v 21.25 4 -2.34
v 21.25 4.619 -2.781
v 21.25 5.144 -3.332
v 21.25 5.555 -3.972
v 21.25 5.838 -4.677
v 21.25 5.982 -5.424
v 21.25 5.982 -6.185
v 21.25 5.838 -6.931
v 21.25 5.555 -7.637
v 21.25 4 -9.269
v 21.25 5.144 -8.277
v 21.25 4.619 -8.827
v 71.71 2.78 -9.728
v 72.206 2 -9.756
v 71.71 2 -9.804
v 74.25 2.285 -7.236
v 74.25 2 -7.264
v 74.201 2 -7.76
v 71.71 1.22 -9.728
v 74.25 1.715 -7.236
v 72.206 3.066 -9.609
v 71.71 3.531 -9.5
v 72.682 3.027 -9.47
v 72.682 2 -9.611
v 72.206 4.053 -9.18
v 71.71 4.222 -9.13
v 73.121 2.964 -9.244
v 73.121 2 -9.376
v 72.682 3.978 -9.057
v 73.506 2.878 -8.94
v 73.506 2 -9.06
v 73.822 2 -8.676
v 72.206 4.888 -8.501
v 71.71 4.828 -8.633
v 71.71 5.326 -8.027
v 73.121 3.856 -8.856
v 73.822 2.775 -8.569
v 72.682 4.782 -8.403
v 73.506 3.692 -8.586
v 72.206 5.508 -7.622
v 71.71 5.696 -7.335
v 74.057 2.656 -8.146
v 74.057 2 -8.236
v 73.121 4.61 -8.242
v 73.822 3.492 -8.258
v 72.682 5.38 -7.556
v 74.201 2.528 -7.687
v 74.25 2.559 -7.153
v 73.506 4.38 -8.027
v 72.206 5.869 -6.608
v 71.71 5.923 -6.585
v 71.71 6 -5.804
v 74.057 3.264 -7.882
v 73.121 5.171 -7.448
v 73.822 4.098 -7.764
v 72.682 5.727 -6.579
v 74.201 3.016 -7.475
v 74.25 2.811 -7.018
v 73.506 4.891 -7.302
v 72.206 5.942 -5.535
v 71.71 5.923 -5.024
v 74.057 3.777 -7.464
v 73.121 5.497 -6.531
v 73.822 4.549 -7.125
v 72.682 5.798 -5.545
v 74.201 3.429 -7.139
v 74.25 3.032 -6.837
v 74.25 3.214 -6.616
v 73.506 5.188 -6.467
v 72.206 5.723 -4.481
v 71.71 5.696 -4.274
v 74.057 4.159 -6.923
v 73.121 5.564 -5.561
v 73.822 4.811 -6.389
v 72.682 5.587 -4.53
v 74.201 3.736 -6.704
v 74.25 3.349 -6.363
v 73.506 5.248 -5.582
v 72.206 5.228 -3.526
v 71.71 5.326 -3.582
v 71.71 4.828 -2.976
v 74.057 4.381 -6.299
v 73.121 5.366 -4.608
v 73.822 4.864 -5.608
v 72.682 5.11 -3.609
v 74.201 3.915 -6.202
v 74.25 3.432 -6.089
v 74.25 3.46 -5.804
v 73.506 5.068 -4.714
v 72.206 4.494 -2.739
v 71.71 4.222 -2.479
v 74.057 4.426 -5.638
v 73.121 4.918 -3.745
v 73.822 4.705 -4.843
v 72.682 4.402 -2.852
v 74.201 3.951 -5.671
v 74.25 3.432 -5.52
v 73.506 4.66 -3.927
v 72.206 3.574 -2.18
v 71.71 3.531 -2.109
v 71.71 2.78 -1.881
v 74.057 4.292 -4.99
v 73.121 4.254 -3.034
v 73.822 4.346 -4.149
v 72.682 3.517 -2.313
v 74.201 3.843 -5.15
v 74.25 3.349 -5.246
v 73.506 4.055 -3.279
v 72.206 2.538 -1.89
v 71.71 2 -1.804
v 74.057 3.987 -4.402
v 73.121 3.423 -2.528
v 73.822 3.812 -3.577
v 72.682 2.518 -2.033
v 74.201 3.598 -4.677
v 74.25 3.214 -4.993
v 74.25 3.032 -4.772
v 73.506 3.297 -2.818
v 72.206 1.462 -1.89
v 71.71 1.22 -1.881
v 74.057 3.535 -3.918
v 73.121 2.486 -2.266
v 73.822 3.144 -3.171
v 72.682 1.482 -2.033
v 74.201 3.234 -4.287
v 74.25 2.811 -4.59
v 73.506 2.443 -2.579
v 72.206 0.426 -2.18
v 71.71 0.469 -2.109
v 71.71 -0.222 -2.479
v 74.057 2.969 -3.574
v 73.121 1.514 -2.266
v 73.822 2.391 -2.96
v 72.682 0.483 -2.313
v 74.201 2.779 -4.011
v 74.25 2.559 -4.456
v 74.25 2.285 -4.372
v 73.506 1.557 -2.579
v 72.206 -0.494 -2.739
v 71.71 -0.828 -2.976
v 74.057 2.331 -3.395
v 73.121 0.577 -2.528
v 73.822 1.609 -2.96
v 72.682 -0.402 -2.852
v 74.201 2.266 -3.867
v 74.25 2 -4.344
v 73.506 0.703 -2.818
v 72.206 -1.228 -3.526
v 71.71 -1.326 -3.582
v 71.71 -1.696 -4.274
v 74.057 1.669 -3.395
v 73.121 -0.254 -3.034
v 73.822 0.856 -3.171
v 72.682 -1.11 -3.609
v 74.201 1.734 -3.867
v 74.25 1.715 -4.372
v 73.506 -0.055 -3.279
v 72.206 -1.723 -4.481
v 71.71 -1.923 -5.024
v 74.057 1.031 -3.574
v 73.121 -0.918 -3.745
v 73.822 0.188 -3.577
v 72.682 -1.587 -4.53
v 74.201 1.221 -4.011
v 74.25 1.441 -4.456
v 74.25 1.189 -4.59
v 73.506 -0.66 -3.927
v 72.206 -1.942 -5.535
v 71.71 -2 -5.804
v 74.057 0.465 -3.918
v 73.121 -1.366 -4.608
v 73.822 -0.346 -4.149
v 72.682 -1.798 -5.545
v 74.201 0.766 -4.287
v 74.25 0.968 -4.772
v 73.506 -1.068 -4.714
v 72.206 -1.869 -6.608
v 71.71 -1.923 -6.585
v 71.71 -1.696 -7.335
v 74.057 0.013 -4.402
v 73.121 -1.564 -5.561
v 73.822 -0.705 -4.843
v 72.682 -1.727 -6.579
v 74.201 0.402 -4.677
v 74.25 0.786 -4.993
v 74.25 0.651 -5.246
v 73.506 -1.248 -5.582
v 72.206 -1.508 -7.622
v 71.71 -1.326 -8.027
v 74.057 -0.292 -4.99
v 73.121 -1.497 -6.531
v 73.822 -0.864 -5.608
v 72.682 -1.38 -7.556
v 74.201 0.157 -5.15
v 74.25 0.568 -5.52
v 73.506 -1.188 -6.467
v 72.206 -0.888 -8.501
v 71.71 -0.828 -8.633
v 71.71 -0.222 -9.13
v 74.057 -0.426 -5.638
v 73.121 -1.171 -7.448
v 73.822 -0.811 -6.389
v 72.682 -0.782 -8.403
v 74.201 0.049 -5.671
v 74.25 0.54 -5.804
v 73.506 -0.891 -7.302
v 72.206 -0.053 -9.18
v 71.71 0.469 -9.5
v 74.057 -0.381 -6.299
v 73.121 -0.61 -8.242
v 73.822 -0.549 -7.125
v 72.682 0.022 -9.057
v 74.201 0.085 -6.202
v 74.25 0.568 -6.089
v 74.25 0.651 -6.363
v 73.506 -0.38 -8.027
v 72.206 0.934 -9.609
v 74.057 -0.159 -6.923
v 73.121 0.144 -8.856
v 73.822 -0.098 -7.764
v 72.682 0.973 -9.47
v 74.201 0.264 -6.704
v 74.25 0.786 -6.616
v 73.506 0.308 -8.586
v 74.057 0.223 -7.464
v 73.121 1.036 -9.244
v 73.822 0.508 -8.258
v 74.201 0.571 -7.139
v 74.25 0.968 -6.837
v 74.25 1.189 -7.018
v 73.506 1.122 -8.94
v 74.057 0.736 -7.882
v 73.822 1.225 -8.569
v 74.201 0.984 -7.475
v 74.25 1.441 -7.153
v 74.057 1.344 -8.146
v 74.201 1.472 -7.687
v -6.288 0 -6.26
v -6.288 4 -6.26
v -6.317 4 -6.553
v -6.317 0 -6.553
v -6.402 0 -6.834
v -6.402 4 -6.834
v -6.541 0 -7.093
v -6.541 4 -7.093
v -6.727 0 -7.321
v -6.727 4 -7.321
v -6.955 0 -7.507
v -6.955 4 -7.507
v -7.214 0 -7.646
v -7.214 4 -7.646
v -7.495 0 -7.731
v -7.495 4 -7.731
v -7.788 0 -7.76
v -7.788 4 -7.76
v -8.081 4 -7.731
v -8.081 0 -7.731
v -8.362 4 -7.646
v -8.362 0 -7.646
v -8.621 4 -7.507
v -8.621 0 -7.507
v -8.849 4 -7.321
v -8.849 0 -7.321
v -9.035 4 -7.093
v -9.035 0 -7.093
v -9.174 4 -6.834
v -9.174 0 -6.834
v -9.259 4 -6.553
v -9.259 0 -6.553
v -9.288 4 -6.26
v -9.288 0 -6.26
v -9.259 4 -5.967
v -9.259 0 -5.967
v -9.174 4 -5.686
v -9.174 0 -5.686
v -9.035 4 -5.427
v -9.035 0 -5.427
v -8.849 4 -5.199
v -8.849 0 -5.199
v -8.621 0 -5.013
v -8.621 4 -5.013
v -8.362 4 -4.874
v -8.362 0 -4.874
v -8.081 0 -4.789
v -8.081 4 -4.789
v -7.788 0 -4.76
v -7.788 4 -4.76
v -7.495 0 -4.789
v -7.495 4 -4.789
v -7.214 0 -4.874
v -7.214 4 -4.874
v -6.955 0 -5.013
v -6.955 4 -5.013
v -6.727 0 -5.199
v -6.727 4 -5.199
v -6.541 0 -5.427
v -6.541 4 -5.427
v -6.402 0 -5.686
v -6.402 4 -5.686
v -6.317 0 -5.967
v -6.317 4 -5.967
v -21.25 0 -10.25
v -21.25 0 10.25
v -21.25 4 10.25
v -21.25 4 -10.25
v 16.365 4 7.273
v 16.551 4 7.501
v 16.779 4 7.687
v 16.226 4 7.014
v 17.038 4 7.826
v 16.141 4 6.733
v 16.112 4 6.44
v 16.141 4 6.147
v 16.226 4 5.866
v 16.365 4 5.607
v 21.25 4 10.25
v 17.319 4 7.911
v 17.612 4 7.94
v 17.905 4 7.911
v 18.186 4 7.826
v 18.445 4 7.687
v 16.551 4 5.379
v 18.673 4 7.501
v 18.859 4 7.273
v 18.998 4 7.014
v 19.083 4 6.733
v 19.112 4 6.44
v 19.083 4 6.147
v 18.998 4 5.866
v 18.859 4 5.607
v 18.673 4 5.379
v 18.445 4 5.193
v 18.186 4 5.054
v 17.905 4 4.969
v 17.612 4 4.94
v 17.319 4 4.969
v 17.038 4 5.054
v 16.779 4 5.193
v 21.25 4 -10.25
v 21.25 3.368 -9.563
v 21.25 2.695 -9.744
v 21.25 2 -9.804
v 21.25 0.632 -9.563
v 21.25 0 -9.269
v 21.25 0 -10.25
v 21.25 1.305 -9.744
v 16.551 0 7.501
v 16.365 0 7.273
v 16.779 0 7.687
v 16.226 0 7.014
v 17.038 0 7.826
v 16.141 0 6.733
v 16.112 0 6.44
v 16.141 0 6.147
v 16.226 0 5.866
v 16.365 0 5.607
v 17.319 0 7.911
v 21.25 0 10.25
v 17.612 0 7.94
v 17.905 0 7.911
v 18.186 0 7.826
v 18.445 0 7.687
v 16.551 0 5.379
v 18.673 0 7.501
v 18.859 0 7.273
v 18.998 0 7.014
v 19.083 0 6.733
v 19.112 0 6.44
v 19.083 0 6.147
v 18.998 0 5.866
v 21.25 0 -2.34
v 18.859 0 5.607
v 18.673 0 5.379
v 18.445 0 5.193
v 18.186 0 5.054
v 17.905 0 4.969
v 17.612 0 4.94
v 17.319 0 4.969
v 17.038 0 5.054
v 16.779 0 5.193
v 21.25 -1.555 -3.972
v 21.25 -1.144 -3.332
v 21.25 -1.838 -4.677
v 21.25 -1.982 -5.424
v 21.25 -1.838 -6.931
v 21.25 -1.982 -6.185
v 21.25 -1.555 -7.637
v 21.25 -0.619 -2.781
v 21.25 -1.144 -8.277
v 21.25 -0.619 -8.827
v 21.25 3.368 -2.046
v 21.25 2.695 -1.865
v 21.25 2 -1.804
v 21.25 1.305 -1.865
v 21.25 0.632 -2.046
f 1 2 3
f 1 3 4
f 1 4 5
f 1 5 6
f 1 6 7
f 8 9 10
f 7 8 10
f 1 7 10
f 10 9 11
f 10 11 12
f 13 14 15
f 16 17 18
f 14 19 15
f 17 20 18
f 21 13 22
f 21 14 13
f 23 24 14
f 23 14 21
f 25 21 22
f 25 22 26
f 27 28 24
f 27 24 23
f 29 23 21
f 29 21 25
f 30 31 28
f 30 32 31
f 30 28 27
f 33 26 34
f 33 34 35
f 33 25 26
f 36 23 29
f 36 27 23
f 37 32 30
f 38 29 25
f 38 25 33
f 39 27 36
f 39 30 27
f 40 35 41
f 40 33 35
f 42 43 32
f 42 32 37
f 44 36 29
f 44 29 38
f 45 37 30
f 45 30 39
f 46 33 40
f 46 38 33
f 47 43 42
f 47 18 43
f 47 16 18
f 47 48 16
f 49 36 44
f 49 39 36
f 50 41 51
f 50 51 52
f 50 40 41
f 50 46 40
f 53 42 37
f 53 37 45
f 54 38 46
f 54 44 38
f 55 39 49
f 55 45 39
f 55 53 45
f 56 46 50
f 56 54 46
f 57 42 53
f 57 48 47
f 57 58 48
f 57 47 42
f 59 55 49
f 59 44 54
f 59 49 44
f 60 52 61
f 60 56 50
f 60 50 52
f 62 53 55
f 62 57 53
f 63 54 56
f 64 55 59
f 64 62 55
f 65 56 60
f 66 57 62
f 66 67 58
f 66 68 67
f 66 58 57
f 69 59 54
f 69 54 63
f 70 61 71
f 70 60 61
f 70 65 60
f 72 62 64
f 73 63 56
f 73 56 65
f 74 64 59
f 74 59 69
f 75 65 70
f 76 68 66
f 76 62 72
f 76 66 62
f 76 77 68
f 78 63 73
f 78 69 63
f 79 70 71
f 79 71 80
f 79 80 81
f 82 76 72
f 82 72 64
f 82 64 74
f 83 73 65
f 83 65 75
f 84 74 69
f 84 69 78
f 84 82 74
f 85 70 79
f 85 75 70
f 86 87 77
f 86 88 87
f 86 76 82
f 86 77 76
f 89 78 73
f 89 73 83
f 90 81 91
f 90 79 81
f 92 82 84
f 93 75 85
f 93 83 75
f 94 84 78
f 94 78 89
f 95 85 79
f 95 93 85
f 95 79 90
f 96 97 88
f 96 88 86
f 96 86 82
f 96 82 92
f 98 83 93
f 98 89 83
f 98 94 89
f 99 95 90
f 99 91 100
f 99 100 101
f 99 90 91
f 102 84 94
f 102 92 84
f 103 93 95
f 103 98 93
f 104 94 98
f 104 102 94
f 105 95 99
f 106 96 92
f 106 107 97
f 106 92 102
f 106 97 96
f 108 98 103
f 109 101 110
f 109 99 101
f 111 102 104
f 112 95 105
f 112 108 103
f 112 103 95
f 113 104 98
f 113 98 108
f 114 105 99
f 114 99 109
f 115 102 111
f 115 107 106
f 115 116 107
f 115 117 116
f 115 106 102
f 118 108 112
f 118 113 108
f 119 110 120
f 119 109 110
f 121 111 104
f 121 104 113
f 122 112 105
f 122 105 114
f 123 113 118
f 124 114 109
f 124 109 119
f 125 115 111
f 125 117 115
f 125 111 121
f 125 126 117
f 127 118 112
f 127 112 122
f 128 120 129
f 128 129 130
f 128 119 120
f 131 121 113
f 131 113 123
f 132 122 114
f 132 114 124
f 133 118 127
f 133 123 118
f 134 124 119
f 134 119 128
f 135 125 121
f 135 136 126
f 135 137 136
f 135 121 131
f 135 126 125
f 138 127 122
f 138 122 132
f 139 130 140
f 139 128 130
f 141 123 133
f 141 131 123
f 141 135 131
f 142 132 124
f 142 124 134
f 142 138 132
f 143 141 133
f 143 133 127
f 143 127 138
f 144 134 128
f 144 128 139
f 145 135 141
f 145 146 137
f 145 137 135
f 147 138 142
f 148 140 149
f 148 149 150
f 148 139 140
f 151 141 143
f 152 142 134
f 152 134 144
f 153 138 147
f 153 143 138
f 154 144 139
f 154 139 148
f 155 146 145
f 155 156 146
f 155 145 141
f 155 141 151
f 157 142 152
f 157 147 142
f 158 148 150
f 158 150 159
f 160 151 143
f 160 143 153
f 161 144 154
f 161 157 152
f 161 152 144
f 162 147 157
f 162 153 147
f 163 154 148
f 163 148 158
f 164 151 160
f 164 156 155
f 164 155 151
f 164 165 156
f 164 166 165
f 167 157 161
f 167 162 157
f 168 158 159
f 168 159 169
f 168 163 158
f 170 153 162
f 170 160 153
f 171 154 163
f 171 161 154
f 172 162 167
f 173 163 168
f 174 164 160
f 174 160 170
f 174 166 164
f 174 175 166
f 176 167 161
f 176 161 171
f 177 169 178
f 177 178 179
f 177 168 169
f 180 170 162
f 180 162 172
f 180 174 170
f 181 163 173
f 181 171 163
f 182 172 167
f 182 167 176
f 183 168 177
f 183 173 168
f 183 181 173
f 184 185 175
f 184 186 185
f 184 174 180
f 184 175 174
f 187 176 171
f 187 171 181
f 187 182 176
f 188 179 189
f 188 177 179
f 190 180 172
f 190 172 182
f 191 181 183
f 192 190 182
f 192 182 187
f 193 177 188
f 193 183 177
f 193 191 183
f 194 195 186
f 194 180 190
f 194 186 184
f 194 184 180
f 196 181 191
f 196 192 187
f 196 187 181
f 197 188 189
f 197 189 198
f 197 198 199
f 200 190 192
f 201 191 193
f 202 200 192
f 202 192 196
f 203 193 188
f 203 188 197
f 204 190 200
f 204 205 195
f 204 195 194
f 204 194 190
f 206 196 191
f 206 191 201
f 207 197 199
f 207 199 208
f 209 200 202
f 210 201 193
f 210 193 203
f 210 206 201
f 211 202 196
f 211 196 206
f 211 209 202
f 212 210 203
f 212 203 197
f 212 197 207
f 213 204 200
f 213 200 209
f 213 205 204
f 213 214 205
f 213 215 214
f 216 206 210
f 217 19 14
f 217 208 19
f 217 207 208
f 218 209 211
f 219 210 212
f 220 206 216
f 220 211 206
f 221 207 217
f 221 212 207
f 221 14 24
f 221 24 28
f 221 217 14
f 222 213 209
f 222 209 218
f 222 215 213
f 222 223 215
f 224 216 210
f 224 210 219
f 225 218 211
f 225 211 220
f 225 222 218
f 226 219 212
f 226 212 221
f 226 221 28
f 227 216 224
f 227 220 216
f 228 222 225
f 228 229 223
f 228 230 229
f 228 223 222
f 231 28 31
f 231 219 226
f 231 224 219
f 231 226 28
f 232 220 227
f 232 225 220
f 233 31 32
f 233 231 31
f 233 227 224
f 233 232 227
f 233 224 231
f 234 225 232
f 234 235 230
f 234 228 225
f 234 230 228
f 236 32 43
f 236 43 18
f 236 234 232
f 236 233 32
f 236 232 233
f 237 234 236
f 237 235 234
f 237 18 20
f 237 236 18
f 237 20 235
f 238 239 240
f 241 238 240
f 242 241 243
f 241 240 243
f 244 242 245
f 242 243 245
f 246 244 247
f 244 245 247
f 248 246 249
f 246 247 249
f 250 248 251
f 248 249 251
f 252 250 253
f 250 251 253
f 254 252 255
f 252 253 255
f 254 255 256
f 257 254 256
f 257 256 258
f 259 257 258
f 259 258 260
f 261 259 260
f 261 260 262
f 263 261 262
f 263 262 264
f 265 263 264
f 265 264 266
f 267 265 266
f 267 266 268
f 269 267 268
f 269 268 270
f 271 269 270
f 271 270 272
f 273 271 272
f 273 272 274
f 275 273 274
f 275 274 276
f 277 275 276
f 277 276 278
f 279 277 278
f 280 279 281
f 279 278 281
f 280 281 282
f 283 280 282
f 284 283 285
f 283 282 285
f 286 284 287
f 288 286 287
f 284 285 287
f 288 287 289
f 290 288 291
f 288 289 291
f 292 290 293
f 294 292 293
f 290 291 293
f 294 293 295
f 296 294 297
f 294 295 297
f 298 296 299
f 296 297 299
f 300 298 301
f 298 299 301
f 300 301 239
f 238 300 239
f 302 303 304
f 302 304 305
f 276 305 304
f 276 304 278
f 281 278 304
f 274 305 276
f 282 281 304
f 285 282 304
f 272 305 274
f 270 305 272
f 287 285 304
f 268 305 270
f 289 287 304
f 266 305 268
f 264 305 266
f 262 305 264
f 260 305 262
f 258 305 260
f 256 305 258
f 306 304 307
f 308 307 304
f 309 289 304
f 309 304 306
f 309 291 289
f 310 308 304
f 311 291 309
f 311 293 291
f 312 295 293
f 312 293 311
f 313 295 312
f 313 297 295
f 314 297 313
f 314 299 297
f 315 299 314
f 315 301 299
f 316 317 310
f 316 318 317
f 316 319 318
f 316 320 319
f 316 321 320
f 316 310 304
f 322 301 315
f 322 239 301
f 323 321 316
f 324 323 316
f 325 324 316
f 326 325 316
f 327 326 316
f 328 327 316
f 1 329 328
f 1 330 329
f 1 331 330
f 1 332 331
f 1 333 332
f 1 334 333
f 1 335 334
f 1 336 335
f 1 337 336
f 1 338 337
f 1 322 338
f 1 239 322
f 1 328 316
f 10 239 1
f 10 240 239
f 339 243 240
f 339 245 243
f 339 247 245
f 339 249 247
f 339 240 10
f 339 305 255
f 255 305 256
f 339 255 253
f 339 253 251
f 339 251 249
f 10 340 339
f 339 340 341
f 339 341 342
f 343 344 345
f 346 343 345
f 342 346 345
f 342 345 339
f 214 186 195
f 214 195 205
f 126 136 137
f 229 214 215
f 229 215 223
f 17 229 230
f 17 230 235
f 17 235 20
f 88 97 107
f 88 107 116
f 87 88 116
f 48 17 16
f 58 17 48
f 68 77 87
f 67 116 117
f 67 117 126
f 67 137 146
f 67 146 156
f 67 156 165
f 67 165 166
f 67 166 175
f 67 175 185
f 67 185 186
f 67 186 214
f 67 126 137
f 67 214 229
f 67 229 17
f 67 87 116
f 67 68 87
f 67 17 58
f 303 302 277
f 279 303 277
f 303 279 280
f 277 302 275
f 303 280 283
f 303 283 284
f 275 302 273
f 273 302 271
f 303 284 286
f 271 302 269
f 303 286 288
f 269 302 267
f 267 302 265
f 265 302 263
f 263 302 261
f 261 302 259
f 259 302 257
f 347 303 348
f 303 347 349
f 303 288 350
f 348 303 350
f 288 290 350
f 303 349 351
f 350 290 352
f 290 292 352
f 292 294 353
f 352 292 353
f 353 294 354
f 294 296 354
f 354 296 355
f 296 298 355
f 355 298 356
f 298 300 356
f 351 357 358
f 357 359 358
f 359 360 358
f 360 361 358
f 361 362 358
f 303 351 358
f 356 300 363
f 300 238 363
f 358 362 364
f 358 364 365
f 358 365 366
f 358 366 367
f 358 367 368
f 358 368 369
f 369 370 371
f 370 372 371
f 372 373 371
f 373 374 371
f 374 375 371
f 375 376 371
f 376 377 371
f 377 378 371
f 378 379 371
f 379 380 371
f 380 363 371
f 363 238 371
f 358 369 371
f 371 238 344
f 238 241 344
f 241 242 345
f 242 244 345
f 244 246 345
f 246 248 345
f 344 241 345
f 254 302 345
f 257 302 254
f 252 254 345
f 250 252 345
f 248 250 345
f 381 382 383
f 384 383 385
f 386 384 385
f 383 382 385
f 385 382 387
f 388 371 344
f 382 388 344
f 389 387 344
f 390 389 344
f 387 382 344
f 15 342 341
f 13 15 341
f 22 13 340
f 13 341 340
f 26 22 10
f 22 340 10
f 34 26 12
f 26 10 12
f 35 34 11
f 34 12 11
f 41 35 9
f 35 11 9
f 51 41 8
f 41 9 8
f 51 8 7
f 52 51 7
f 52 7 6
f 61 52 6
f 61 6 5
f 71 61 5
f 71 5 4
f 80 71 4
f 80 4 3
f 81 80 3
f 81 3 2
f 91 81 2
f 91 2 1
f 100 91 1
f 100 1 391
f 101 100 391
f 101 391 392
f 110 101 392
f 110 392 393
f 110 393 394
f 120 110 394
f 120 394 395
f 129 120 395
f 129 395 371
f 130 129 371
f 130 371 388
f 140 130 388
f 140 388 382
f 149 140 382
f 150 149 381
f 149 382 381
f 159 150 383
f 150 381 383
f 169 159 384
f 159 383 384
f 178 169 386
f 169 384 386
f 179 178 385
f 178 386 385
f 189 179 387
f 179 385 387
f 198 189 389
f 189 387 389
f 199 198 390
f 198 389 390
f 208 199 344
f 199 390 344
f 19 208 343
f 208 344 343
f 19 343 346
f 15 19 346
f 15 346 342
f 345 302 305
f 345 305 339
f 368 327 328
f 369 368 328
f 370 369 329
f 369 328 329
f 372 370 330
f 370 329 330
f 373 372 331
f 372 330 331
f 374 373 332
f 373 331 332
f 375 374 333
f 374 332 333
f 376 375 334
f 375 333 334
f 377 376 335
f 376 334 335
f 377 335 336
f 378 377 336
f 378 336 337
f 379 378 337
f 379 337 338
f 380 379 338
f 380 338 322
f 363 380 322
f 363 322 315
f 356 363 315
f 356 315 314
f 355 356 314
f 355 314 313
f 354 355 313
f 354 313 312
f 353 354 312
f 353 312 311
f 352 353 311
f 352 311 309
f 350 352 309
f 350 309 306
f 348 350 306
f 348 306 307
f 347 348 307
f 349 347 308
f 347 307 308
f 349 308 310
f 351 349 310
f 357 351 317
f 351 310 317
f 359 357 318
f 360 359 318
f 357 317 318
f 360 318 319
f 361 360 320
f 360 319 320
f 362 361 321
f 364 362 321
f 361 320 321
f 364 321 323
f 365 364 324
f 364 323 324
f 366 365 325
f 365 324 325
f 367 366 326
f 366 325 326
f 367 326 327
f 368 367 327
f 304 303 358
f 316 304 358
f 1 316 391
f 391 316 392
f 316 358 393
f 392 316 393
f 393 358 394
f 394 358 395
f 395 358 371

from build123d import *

# Parameters (mm, degrees)
SKETCH1_W           = 42.5
SKETCH1_H           = 20.5
BOSS_EXTRUDE1_DEPTH = 4
SKETCH2_R           = 4
BOSS_EXTRUDE2_DEPTH = 53
FILLET1_R           = 2.54
SKETCH4_R           = 1.5
CUT_EXTRUDE2_DEPTH  = 7.0000001


with BuildPart() as part:
    # Sketch1 → Boss-Extrude1 (new body)
    with BuildSketch(Plane(origin=(0, 0, 0), x_dir=(1, 0, 0), z_dir=(0, 1, 0))):
        Rectangle(SKETCH1_W, SKETCH1_H)
    extrude(amount=BOSS_EXTRUDE1_DEPTH)

    # Sketch2 → Boss-Extrude2 (add)
    with BuildSketch(Plane(origin=(21.25, 0, 0), x_dir=(0, 0, -1), z_dir=(1, 0, 0))):
        with Locations((5.804410425, 2)):
            Circle(SKETCH2_R)
    extrude(amount=BOSS_EXTRUDE2_DEPTH)

    # Fillet1
    fillet1_edges = [part.edges().sort_by_distance(p)[0] for p in [
        (74.25, 2, -1.804410425),
    ]]
    fillet(fillet1_edges, radius=FILLET1_R)

    # Sketch4 → Cut-Extrude2 (cut, through all)
    with BuildSketch(Plane(origin=(0, 4, 0), x_dir=(1, 0, 0), z_dir=(0, 1, 0))):
        with Locations((17.612, -6.44)):
            Circle(SKETCH4_R)
        with Locations((-7.788, 6.26)):
            Circle(SKETCH4_R)
    extrude(amount=-CUT_EXTRUDE2_DEPTH, mode=Mode.SUBTRACT)


solid = part.part
